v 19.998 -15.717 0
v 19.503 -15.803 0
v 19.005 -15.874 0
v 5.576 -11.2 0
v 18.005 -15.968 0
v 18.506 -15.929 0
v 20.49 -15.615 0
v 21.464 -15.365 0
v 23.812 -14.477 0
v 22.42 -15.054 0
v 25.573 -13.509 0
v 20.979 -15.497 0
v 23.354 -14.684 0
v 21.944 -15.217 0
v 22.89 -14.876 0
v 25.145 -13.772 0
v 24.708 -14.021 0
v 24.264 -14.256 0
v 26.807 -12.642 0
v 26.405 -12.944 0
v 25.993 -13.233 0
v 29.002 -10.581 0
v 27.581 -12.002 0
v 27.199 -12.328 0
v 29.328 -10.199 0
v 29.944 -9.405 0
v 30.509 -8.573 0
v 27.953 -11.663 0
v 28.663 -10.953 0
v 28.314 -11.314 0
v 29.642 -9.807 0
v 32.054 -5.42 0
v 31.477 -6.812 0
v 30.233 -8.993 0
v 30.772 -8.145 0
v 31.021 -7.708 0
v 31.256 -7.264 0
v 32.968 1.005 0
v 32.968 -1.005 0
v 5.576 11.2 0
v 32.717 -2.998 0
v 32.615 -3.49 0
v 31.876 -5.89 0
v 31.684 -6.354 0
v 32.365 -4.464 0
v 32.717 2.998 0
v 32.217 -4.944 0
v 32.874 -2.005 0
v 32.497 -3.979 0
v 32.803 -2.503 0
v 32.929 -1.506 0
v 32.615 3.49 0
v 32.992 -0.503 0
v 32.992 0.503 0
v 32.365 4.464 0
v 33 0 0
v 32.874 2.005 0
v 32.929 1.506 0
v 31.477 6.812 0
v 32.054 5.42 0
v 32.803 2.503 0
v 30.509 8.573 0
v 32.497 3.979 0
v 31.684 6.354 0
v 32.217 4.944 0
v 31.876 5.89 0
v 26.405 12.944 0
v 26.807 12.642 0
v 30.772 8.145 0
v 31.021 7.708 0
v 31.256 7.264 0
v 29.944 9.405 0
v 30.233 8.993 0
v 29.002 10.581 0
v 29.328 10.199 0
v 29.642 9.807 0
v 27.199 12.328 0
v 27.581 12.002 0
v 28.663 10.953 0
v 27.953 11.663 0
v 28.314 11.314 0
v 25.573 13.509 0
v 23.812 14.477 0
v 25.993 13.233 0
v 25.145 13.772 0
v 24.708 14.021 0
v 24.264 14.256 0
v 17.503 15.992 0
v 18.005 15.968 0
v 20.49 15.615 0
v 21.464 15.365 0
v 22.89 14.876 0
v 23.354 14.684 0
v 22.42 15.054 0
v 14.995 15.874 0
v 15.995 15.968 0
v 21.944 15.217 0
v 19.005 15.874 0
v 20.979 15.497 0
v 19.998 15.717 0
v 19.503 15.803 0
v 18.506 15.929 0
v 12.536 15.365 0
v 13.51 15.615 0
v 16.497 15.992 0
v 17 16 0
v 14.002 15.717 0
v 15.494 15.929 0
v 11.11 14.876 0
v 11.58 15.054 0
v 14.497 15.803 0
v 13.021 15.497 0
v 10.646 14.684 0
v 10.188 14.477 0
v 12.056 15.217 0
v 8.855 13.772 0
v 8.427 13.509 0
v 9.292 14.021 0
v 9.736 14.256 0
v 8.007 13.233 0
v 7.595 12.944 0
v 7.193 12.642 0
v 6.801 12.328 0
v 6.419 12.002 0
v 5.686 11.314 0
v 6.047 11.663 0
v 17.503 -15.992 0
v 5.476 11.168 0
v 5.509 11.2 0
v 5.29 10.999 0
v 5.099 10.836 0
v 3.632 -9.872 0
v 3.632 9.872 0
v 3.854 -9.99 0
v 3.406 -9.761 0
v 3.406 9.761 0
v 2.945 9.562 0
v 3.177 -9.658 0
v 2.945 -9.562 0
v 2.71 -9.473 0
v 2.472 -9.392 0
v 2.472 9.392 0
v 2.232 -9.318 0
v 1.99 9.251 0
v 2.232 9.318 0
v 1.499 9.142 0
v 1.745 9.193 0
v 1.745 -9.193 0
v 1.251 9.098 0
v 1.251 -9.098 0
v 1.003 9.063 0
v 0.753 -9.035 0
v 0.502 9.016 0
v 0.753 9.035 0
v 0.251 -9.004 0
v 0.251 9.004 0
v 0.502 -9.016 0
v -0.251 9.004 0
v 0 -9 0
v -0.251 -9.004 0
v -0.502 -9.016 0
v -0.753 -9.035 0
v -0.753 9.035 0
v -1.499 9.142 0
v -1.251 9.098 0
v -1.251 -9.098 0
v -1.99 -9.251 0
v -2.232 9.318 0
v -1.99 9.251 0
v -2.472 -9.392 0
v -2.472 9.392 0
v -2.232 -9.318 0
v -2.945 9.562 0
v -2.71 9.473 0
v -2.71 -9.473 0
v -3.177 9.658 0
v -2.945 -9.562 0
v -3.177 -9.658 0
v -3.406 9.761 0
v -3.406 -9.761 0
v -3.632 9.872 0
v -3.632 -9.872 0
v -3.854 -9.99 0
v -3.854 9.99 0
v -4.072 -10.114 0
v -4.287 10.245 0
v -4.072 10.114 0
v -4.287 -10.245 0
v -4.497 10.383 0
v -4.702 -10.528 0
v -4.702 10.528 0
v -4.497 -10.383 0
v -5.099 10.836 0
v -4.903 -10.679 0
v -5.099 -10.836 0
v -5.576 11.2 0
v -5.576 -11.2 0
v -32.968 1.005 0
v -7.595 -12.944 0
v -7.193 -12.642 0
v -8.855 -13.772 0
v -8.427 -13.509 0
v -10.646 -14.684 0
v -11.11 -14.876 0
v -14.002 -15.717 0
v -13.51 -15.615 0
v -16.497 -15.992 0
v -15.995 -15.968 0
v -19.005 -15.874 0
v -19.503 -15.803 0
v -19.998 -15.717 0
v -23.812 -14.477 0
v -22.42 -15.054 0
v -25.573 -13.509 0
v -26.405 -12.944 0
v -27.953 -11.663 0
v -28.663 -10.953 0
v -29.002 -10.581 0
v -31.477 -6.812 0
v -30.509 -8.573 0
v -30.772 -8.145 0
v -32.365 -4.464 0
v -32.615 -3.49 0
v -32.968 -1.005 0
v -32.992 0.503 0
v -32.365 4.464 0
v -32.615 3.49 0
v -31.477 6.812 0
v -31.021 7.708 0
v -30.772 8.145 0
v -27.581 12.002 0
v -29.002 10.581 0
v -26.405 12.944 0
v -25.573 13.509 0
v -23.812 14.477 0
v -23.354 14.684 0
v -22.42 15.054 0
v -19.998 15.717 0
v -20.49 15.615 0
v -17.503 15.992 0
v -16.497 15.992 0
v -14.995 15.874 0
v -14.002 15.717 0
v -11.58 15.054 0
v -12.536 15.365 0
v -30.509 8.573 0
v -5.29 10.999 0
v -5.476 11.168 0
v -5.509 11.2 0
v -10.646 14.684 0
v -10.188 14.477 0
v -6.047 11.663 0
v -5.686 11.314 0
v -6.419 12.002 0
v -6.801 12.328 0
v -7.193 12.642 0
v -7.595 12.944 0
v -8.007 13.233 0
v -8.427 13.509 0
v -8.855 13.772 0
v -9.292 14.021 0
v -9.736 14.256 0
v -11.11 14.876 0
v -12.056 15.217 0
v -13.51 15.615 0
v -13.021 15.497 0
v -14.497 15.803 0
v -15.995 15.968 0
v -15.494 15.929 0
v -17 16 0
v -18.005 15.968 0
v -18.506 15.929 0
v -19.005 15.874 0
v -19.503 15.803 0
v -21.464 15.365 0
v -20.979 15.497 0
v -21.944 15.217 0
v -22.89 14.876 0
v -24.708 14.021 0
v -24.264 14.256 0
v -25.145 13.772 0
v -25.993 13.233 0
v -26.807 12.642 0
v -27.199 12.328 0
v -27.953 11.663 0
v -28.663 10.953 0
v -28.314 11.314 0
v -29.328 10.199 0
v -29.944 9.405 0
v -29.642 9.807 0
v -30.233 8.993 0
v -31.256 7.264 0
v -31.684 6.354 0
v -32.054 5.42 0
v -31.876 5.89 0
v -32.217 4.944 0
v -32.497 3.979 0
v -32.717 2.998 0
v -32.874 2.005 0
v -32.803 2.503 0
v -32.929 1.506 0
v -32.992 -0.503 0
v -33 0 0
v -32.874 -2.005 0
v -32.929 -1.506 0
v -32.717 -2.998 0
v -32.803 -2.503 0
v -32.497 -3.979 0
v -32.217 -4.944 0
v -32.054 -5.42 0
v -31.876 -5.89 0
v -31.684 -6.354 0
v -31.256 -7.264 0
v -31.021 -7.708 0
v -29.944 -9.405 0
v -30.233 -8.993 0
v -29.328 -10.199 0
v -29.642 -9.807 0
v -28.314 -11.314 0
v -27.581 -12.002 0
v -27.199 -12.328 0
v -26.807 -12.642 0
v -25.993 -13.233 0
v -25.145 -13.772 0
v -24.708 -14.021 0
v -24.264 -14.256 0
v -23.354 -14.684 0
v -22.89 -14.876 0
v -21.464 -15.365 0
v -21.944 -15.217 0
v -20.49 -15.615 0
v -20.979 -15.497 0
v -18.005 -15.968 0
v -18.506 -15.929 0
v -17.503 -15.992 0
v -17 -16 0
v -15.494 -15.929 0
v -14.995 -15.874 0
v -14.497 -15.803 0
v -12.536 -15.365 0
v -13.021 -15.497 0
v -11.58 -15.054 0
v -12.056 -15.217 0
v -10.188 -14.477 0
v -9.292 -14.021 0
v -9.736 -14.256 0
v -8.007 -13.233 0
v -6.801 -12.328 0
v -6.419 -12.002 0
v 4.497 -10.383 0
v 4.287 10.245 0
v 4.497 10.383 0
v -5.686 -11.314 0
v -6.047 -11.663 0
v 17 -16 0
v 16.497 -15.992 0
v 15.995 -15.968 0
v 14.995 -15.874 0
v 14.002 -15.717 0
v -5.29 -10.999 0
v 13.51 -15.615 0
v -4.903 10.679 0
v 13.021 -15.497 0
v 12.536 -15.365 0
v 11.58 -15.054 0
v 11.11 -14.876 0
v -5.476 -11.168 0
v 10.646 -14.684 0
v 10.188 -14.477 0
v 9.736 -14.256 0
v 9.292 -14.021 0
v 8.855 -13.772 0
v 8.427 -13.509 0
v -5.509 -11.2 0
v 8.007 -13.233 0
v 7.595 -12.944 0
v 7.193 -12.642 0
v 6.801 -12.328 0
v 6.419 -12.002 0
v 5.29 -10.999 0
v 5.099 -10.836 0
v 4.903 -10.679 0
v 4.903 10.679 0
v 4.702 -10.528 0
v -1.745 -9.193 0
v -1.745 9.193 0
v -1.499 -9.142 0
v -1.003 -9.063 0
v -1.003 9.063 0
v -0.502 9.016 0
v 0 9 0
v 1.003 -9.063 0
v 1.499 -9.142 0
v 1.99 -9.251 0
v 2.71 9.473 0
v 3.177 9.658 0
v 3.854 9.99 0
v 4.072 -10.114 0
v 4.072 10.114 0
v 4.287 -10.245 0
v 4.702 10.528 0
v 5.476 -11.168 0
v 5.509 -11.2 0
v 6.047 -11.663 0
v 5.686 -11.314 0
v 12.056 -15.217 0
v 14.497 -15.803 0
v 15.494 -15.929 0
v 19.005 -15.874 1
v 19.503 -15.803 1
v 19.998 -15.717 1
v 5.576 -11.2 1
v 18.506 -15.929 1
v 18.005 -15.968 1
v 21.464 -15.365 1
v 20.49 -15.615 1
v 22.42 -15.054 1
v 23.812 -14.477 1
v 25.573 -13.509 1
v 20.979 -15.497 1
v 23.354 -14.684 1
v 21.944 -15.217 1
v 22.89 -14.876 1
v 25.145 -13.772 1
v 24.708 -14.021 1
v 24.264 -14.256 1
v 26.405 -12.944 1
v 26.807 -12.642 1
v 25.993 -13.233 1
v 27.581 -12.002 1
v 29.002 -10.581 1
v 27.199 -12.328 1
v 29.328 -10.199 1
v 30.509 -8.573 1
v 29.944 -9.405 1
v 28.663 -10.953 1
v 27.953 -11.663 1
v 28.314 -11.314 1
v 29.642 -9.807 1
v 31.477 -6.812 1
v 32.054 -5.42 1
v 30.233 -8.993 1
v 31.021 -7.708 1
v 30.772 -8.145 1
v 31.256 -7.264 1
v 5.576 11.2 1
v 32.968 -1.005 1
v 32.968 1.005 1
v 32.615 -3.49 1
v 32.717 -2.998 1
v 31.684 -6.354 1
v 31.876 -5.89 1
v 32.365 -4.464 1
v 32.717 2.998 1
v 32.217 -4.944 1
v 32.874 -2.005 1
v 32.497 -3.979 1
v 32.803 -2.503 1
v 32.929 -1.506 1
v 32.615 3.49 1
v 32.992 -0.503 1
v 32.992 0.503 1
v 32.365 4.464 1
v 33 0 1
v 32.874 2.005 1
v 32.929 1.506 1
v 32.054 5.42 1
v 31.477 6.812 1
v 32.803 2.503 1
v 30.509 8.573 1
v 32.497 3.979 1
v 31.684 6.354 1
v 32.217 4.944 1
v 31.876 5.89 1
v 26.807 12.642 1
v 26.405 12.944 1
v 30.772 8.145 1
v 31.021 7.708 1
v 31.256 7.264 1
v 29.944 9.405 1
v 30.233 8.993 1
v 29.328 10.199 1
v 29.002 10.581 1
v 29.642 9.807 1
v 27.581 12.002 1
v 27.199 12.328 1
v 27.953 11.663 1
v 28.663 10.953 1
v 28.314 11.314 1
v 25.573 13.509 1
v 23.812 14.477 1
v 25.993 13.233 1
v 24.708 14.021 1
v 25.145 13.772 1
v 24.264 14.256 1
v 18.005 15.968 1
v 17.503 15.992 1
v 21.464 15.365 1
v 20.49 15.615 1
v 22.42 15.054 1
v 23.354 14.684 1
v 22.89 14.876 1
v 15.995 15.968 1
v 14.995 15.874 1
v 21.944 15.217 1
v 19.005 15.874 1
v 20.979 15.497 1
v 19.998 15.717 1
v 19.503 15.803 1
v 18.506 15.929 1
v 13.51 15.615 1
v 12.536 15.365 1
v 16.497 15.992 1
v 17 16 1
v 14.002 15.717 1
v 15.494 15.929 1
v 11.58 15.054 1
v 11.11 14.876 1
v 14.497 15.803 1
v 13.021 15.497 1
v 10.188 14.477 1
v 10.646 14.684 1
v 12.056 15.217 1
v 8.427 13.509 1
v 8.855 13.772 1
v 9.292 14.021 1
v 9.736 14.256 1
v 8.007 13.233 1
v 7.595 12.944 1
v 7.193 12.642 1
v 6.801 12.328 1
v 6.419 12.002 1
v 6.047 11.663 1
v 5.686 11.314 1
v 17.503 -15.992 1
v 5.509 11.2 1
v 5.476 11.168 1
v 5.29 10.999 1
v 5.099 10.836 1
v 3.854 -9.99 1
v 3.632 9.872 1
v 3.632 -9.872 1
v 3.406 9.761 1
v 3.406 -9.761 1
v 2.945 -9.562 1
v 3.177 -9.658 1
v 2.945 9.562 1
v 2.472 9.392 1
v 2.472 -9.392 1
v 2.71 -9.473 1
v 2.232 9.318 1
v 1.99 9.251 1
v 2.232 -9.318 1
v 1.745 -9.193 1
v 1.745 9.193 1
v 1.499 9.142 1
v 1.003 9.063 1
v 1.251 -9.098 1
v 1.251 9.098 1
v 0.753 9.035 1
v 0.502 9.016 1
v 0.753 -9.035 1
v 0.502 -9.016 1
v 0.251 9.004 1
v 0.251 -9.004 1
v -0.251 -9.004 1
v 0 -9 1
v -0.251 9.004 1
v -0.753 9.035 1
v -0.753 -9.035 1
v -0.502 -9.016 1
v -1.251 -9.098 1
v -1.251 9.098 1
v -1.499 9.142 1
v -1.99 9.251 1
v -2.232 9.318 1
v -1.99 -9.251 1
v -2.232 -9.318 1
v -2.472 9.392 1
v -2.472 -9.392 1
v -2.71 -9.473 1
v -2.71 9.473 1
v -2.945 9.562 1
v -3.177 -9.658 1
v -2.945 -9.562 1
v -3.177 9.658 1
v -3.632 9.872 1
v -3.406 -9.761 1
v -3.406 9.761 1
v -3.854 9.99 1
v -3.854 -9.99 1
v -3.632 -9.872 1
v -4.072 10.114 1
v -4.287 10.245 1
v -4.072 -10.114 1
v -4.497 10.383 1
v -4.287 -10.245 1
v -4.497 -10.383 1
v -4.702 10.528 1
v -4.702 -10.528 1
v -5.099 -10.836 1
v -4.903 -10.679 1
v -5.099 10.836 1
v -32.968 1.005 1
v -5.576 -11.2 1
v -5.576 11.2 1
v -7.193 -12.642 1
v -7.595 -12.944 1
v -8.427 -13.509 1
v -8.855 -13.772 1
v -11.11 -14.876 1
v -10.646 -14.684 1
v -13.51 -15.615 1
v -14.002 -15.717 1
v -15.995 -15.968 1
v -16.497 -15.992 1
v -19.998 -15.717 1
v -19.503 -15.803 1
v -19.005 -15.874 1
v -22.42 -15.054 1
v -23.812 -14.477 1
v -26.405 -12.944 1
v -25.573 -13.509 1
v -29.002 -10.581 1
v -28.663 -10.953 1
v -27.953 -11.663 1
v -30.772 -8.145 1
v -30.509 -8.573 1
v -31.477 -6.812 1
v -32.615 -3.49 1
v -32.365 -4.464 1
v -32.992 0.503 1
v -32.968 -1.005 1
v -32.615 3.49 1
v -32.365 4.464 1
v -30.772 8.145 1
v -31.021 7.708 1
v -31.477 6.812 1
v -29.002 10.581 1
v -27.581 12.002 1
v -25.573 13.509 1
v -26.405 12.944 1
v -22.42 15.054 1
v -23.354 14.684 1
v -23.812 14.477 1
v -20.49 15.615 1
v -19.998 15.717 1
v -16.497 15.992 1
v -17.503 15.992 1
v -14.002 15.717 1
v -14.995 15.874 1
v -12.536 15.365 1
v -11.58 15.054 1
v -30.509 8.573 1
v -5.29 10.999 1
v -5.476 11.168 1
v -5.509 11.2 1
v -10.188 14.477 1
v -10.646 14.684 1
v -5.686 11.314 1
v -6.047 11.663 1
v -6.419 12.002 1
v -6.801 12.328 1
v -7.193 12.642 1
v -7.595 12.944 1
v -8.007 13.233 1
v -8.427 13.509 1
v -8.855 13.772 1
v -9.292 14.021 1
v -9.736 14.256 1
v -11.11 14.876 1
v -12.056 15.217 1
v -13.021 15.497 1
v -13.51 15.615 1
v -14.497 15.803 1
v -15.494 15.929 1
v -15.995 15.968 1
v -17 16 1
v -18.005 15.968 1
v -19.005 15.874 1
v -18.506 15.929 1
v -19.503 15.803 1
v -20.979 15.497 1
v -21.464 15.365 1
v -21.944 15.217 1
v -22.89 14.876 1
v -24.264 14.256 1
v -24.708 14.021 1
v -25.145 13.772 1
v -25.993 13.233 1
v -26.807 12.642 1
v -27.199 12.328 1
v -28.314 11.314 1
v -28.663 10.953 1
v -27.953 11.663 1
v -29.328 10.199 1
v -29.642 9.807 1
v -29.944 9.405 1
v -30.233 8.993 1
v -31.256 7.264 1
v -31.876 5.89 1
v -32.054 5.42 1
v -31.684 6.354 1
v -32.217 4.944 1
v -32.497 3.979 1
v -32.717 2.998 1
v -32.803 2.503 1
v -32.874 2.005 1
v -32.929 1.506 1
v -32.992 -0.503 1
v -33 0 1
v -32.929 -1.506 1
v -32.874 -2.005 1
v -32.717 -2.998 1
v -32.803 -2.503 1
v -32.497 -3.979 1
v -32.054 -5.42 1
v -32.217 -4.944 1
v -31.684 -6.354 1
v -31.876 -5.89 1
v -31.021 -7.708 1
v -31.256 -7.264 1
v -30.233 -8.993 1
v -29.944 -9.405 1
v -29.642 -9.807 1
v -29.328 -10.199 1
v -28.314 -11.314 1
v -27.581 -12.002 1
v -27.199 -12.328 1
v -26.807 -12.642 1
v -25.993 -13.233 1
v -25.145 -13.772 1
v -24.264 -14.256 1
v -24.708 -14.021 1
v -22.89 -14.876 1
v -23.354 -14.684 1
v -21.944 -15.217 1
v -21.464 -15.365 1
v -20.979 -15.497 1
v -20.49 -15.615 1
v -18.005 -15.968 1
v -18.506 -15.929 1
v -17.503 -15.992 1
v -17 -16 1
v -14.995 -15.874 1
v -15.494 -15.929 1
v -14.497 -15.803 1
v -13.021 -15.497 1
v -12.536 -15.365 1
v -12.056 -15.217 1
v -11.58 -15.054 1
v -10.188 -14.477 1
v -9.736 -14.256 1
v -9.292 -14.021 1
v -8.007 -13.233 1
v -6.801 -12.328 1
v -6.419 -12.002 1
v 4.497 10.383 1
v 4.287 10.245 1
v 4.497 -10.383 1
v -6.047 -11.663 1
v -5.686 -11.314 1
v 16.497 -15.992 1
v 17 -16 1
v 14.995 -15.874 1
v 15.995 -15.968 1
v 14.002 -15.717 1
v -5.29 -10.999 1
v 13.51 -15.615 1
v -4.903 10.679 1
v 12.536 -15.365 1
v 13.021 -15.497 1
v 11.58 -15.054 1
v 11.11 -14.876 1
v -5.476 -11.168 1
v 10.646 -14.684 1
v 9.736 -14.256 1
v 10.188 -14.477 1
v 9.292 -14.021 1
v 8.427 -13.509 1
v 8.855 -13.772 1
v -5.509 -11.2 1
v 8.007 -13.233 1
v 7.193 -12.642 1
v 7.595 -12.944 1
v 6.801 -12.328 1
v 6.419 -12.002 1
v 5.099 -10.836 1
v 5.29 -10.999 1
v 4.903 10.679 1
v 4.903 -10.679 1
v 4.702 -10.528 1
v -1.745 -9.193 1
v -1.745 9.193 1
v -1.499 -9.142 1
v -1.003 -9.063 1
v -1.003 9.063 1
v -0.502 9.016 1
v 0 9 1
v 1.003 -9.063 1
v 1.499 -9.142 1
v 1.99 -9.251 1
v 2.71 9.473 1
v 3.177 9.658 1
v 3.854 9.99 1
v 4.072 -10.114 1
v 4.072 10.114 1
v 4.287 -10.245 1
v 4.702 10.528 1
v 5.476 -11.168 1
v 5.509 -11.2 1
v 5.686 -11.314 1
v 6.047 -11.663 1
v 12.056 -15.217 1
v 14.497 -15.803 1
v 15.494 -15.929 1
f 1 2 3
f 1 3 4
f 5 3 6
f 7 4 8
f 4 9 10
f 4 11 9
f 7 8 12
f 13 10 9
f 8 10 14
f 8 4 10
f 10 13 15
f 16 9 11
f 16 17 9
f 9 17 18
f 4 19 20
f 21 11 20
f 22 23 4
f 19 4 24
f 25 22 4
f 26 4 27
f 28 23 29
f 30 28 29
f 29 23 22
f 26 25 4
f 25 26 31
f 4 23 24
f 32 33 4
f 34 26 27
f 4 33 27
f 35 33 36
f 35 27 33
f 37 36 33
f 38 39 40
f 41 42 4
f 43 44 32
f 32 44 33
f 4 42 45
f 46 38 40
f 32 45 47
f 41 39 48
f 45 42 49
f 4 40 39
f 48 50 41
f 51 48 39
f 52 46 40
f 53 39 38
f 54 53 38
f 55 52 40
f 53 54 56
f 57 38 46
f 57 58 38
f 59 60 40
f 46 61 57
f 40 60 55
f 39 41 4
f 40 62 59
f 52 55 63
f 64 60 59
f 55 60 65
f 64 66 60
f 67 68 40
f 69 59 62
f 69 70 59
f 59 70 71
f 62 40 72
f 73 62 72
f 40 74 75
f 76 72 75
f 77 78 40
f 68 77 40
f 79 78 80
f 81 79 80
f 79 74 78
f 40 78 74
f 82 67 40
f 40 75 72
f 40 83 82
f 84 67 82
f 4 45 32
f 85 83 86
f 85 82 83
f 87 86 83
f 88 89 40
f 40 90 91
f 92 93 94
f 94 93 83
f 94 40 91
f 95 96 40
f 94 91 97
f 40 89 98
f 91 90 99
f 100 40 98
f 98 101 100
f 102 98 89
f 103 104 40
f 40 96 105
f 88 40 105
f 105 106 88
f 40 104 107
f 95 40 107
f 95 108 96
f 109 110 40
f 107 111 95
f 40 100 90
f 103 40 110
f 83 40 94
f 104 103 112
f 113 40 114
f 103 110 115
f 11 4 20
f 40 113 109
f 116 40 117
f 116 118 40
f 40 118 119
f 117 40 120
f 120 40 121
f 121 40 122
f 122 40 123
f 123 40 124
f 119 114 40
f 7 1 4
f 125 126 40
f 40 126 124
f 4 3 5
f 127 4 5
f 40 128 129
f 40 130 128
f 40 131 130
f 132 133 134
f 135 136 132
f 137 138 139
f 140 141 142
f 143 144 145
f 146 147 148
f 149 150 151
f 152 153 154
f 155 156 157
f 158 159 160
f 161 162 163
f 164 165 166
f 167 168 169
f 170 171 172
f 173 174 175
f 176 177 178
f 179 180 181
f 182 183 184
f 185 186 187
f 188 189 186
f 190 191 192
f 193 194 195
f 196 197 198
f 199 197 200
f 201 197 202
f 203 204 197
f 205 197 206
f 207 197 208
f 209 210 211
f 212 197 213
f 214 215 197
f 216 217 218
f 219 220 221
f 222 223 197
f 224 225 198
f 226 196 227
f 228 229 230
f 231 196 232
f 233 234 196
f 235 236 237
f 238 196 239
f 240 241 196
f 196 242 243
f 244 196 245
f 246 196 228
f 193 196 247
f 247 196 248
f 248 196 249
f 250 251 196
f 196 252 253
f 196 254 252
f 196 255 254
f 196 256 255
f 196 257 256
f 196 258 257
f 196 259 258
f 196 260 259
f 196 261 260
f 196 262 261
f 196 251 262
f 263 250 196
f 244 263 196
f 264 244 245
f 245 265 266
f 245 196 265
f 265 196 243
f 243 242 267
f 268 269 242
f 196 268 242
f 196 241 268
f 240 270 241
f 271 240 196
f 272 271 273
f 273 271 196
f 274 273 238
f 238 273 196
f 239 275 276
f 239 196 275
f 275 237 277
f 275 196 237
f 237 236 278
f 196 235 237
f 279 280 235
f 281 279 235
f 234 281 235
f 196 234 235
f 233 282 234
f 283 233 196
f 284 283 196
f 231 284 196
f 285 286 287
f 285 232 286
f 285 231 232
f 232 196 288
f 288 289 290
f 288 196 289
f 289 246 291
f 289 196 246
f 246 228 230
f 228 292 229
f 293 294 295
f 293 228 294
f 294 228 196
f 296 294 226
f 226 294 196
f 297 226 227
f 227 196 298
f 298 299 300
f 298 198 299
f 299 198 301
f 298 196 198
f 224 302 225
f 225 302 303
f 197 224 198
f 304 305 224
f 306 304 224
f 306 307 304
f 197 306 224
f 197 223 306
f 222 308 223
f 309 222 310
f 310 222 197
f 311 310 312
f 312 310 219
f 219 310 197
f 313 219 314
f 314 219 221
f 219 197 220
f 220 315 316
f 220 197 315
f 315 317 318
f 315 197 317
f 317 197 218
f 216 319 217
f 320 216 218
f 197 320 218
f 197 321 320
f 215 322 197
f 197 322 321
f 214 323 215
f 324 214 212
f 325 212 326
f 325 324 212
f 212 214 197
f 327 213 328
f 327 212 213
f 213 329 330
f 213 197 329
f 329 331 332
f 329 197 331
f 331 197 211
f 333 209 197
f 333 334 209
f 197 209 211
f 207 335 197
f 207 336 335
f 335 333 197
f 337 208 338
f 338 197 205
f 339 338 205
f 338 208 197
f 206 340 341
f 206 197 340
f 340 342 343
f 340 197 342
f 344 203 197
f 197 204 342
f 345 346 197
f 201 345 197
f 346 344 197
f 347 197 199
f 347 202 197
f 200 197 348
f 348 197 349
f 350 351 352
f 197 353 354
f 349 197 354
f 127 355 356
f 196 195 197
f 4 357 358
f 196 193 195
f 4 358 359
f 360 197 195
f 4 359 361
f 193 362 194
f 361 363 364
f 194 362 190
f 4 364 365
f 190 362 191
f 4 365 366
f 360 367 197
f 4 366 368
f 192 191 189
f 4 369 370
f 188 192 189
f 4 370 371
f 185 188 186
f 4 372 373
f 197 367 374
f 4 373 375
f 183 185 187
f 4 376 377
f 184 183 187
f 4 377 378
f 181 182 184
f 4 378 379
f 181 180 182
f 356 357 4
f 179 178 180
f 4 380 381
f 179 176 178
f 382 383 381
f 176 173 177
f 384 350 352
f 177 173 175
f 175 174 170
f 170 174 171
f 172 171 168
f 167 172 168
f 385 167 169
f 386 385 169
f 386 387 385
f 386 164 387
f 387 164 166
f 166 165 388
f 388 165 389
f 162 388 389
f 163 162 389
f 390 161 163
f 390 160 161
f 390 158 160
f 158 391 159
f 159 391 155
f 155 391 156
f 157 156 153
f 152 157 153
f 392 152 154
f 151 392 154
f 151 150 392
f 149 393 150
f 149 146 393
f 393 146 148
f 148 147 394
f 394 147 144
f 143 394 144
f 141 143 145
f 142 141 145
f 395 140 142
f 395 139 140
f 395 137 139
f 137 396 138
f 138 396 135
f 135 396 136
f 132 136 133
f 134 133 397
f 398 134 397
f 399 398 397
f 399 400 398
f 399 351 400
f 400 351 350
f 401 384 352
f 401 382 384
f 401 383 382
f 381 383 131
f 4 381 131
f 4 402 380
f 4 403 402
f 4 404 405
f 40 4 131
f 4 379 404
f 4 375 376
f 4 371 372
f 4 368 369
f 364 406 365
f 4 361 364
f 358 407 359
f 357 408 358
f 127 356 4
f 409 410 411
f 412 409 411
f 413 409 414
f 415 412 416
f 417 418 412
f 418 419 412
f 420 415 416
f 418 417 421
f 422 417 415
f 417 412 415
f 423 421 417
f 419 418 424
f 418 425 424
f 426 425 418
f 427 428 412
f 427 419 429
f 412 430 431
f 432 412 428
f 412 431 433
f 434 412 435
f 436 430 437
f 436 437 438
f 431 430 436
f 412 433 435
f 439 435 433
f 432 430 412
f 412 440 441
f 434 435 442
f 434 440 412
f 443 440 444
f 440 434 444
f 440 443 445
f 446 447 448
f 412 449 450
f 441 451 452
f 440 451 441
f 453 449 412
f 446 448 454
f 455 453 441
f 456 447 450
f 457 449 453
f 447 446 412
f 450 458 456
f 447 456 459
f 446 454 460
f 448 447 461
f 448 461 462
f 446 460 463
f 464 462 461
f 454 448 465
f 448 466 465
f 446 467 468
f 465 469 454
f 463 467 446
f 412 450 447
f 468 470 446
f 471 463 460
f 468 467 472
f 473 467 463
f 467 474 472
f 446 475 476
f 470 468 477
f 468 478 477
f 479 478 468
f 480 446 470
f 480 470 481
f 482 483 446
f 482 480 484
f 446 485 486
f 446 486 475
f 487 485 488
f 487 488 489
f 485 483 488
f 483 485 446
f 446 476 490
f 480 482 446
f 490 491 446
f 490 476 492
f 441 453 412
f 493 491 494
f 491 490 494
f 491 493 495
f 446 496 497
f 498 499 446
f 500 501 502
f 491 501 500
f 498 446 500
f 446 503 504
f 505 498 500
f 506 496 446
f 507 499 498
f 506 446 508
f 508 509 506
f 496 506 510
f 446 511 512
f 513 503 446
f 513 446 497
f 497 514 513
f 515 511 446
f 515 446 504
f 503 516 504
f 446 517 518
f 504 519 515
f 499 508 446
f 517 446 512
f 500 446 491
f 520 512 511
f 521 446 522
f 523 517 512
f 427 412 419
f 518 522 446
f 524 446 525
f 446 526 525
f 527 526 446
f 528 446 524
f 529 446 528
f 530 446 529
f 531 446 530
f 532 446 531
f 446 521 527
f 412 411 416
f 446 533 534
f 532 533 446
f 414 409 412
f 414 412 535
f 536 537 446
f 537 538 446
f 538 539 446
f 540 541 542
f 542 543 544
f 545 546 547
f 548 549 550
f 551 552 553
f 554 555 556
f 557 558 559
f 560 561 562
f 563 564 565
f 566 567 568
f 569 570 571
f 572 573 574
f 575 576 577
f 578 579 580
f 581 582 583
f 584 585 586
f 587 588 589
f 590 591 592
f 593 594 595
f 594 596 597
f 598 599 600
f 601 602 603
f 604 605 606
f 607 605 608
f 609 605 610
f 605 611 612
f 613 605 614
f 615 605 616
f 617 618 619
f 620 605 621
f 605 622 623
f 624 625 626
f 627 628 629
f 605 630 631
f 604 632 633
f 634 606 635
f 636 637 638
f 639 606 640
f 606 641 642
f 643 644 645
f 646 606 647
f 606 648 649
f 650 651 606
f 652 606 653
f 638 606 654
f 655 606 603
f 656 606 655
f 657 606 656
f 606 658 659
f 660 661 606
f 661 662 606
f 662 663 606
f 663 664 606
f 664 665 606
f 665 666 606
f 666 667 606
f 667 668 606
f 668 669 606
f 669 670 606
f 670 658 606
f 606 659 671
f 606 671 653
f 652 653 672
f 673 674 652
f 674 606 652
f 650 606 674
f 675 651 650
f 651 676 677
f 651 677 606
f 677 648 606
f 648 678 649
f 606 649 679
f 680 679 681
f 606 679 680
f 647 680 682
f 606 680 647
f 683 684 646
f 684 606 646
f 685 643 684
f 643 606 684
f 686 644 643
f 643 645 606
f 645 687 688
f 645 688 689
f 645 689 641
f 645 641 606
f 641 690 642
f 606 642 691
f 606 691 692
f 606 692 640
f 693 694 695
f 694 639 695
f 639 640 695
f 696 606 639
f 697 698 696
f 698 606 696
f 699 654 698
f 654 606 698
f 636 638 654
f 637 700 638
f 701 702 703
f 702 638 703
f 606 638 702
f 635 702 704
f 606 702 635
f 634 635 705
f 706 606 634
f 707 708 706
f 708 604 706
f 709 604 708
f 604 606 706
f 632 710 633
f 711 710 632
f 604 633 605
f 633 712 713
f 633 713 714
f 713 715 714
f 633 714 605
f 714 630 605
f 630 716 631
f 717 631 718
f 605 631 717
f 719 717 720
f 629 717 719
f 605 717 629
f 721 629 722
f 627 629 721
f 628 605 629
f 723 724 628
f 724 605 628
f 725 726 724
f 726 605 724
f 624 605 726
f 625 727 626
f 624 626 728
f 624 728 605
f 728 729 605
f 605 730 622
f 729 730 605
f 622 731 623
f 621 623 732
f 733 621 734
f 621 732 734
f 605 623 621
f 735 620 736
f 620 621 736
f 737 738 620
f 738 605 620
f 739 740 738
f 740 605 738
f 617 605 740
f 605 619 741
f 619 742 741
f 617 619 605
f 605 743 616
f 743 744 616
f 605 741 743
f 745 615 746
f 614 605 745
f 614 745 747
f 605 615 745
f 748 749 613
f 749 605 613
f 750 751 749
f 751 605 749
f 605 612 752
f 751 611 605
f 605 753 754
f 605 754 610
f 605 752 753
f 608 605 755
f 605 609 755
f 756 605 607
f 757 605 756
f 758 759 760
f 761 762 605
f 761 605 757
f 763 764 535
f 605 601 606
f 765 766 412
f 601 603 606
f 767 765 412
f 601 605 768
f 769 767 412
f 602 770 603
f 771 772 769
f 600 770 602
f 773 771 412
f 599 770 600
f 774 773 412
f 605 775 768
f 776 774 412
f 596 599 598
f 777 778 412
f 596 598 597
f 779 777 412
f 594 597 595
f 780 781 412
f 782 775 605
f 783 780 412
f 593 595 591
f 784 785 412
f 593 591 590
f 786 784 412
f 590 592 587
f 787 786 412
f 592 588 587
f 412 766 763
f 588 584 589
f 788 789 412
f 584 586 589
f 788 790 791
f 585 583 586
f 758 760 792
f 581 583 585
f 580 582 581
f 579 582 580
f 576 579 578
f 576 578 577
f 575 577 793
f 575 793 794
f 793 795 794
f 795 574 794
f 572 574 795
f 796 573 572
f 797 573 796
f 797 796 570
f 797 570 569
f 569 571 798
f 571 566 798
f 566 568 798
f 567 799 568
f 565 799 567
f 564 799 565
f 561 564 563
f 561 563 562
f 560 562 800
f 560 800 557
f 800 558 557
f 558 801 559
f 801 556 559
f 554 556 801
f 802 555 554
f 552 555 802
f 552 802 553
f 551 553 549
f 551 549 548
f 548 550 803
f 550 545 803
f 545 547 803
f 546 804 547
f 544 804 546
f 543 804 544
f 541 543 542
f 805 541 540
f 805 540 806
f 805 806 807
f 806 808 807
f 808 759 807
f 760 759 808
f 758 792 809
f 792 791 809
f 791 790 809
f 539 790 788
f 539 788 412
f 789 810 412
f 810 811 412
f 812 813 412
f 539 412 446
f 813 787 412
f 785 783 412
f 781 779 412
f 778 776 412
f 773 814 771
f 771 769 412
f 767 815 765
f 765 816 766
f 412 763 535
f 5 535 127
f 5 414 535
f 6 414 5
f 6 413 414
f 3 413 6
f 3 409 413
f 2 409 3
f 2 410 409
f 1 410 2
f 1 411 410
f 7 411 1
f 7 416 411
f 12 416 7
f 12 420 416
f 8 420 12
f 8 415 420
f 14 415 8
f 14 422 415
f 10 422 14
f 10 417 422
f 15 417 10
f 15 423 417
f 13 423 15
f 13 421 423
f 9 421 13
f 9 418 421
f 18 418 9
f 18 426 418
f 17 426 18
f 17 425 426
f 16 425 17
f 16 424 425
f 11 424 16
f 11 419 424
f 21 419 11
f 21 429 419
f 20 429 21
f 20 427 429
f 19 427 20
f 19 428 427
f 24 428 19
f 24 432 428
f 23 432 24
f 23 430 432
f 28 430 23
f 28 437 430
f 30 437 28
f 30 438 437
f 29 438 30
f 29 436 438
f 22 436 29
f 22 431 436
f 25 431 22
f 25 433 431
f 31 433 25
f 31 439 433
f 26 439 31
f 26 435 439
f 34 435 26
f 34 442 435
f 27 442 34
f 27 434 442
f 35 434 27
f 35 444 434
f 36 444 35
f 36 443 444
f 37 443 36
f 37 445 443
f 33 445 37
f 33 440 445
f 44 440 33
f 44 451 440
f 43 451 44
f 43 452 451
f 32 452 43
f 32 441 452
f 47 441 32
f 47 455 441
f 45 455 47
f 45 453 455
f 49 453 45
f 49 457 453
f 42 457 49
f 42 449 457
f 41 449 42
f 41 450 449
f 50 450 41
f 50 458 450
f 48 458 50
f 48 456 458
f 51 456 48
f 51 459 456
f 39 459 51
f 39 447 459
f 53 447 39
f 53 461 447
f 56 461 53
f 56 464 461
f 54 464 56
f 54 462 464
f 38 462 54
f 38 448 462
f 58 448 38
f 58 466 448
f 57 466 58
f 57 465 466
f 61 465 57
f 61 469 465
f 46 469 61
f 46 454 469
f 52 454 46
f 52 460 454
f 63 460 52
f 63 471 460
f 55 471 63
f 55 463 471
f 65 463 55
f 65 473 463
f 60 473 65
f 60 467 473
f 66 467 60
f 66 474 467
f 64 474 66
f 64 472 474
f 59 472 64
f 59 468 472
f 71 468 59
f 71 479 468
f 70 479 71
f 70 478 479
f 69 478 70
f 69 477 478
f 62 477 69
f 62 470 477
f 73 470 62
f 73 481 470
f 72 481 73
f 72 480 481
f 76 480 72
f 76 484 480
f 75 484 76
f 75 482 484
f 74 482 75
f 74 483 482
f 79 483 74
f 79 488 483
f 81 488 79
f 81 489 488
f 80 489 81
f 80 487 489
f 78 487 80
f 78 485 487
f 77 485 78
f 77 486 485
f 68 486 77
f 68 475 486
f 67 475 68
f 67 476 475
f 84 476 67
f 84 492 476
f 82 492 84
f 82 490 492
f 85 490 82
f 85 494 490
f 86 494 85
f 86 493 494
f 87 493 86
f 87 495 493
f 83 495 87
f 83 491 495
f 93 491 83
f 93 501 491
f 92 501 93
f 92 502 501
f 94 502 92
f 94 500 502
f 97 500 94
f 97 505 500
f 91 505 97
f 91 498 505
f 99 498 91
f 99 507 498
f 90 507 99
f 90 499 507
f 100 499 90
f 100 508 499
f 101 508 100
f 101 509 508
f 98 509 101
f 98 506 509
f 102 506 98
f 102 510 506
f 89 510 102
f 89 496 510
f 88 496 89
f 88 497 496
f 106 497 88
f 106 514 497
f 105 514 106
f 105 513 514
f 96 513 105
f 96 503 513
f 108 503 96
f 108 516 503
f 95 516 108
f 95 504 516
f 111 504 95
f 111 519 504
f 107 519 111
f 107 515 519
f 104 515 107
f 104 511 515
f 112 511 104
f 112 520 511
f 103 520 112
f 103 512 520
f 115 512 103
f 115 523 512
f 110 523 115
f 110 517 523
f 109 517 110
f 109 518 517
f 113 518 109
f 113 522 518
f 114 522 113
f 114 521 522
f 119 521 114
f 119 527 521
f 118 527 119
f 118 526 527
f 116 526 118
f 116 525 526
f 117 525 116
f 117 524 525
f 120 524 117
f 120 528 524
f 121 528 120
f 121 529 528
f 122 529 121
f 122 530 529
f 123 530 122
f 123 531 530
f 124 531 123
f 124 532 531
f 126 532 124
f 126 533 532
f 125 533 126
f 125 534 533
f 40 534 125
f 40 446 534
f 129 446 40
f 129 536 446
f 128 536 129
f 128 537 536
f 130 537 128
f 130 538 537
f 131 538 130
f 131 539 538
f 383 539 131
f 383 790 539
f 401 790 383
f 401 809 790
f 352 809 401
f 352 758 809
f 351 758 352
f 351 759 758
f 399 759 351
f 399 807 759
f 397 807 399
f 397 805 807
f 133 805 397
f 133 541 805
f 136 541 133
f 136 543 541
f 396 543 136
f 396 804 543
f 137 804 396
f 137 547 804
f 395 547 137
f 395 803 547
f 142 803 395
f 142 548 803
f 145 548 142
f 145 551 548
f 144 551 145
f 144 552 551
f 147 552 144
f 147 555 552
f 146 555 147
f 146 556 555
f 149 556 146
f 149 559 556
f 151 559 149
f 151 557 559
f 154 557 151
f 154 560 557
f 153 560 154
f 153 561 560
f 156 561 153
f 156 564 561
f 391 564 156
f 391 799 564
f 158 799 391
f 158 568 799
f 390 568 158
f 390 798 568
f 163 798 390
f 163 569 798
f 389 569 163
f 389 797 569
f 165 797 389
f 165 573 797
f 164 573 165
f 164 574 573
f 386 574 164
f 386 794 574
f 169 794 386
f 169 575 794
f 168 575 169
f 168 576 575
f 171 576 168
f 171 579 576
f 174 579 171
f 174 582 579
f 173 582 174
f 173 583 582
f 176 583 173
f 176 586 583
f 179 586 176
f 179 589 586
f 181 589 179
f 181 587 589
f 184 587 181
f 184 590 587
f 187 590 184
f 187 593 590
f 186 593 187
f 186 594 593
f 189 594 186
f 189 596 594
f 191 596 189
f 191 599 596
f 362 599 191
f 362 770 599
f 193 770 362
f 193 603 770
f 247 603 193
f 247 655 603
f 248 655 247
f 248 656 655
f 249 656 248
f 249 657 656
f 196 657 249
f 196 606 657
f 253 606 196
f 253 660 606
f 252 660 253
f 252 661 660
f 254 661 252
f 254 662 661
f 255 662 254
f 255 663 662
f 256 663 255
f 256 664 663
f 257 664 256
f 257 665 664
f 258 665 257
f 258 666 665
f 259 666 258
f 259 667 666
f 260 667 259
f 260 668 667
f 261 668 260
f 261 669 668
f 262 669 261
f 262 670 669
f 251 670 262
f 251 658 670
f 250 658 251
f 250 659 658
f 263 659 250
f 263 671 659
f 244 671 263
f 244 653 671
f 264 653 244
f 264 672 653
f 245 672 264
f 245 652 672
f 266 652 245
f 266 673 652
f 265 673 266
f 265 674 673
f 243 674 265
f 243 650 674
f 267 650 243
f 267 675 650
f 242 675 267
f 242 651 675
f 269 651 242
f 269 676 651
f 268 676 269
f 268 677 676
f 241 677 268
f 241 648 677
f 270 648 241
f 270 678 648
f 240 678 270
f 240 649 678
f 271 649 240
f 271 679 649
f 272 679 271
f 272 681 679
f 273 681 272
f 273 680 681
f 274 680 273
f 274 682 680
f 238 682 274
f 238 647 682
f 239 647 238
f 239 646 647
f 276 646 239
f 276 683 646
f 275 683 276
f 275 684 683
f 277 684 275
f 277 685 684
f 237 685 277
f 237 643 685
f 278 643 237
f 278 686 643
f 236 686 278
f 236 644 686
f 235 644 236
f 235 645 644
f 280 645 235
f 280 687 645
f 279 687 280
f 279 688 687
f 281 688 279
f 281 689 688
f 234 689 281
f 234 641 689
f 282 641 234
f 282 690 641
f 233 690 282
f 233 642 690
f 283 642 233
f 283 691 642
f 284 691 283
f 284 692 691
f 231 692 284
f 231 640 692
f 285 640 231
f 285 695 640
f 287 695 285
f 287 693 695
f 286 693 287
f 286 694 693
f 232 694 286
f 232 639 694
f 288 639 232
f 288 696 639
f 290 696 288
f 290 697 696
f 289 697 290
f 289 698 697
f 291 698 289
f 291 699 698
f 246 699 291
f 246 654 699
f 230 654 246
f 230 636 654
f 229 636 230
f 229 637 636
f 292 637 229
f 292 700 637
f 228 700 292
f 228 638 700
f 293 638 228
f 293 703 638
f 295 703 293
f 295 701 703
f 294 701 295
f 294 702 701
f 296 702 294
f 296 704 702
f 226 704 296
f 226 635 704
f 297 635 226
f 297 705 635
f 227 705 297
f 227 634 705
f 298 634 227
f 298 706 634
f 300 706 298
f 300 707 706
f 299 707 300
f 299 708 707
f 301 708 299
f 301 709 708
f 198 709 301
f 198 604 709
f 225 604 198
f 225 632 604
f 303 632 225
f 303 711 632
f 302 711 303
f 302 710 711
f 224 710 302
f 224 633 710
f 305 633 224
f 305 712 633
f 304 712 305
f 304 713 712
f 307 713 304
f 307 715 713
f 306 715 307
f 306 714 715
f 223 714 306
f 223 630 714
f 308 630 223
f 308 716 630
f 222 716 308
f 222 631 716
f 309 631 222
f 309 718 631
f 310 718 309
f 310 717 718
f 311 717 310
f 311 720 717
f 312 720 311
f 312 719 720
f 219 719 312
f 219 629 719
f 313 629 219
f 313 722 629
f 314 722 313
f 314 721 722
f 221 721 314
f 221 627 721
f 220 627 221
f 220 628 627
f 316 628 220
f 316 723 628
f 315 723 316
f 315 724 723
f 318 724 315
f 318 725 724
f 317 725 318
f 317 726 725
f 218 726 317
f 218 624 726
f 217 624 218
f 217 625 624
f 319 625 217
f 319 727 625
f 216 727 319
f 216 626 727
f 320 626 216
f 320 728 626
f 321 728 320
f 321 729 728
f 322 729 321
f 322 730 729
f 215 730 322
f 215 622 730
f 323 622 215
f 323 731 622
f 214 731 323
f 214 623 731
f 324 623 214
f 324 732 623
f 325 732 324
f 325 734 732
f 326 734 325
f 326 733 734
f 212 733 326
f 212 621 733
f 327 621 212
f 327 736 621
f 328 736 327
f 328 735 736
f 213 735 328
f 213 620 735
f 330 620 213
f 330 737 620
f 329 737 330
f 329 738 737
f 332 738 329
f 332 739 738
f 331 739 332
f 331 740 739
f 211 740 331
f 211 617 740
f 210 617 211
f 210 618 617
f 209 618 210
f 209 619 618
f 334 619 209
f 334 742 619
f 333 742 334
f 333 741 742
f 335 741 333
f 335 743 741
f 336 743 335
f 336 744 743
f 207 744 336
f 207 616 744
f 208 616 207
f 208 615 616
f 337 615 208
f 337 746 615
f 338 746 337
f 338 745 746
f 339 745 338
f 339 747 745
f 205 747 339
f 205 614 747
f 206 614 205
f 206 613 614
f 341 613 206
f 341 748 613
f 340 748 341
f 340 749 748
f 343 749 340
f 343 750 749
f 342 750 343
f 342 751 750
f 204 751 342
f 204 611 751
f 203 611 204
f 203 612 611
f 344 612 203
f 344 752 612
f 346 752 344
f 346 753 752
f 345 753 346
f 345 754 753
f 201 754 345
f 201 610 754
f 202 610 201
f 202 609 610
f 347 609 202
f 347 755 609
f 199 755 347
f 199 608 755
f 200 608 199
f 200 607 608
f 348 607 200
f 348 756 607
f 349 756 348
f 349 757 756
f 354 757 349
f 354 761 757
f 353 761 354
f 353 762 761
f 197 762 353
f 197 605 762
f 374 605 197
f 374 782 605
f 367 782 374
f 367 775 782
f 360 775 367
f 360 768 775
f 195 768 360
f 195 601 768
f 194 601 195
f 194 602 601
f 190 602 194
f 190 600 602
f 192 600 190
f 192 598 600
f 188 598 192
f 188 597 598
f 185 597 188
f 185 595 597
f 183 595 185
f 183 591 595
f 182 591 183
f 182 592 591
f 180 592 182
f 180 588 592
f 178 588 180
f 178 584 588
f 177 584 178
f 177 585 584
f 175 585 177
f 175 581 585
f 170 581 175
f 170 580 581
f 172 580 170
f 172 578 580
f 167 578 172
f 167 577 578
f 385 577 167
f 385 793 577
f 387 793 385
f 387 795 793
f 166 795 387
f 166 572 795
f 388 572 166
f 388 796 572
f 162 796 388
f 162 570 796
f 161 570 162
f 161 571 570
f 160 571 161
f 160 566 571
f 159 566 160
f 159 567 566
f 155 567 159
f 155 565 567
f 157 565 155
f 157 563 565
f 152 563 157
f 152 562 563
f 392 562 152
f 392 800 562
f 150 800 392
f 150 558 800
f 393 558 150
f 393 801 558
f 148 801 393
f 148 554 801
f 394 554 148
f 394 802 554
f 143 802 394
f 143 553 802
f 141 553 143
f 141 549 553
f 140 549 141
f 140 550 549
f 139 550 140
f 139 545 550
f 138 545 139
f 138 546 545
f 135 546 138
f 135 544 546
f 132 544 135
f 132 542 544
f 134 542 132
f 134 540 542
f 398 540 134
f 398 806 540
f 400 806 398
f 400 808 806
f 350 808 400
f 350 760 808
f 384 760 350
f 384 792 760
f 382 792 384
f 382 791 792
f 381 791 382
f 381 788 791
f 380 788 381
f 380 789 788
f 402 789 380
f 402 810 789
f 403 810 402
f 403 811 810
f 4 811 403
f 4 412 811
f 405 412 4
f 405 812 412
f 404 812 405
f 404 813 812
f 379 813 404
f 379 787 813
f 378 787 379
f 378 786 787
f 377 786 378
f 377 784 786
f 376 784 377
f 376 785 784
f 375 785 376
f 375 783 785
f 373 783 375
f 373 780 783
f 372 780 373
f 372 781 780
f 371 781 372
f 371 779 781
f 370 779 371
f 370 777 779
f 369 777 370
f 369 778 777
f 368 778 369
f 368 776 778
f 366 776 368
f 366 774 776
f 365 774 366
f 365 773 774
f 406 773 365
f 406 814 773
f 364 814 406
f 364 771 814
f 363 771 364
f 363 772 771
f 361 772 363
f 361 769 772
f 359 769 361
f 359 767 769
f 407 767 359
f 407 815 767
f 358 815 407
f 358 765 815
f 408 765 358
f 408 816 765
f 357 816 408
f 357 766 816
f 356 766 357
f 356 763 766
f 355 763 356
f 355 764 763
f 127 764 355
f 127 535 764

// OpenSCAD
bot_r = 33/2;
top_r = 30/2;

// The real bases are more like 3.7mm, but printing that requires 0.1mm layers,
// which is slow. Also a 3.7mm base fits a bit too snugly in the castle ladders.
// 3.6mm seems fine.
height = 3.6;

$fn = 200;

inlay_depth = 1;
lip = 0.8;
inlay_slack = 0.3;

// Make the inlay 1 layer shorter than the cavity for it, to make sure we don't
// accidentally thicken the overall part.
inlay_thickness = inlay_depth-0.2;

penny_diam = 19.25;
penny_height = 1.63;

module single_base() {
  round_r = 0.75;
  difference() {
    rotate_extrude() {
      hull() {
        translate([bot_r-round_r, round_r])
          circle(round_r);
        square([1, height]);
        translate([top_r-1, 0])
          square([1, height]);
      }
    }
    
    // Elephant foot.
    linear_extrude(0.2) {
      difference() {
        circle(100);
        circle(bot_r - round_r + 0.05);
      }
    }
    
    // Inlay well.
    translate([0, 0, height - inlay_depth])
      cylinder(h=inlay_depth+1, r=top_r-lip);
  }
}

// Large single base (like for the Frost Giant), just scale this up to 113%.
module single_large_base_penny() {
  difference() {
    scale([1.13, 1.13, 1])
      single_base();
    
    translate([5.7, 0, height - inlay_depth - penny_height])
      cylinder(d=penny_diam, h=10);
  }
}

module single_inlay() {
  cylinder(h=inlay_thickness, r=top_r-lip-inlay_slack);
}

module single_large_inlay() {
  scale([1.13, 1.13, 1])
    single_inlay();
}

// Largest profile of the double base.
module double_base_2d(large=false) {
  // Large measurements from Brunak. Small measurements from Major Q10.
  length = large ? 81.9 : 77.8;
  width = large ? 37.4 : 31.9;
  waist = large ? 24.7 : 18.4;
  cut_radius = large ? 23.5 : 27;
  
  difference() {
    union() {
      for (a = [-1, 1])
        translate([a*(length - width)/2, 0])
          circle(d=width);
      square([length - width, width*0.83], center=true);
    }
    for (a = [-1, 1])
      translate([0, a*(waist/2 + cut_radius)])
        circle(cut_radius);
  }
}

module double_base_layer(layers_up, offs, large=false) {
  translate([0, 0, layers_up*0.2])
    linear_extrude(0.20001)
      offset(offs)
        double_base_2d(large=large);
}

double_base_slope = 0.115;
double_base_layer_offsets = [
  -0.6, -0.2,
  0, 0,
  -1*double_base_slope,
  -2*double_base_slope,
  -3*double_base_slope,
  -4*double_base_slope,
  -5*double_base_slope,
  -6*double_base_slope,
  -7*double_base_slope,
  -8*double_base_slope,
  -9*double_base_slope,
  -10*double_base_slope,
  -11*double_base_slope,
  -12*double_base_slope,
  -13*double_base_slope,
  -14*double_base_slope,
];
double_base_layer_top_offset = double_base_layer_offsets[17];

module double_base(large=false, pennies=false, washers=0) {
  difference() {
    // Need a total of 18 layers to make 3.6mm.
    for (i = [0:17])
      double_base_layer(i, double_base_layer_offsets[i], large=large);
        
    // Inlay well.
    translate([0, 0, height - inlay_depth])
      linear_extrude(inlay_depth+1)
        offset(double_base_layer_top_offset - lip)
          double_base_2d(large=large);
    
    if (pennies) {
      for (a = [-1, 1])
        scale([a, 1, 1])
          translate([
            large ? 23 : 23.1,
            large ? 
              0 // Change to 6 to offset the pennies.
              : 3.9,
            height - inlay_depth - penny_height
          ])
            cylinder(d=penny_diam, h=10);
      
      // Notch to show which side has the the pennies.
      translate([0, 12, 0])
        cube([1.3, 10, 0.4], center=true);
    }
    
    washer_diam = 11.35;
    washer_height = 1.12;

    if (washers == 1) {
      for (a = [-1, 1])
        scale([a, 1, 1])
          translate([large ? 25.5 : 23.5, 0, height - inlay_depth - washer_height - 0.11])
            cylinder(d=washer_diam + 0.2, h=10);
    } else if (washers == 2) {
      for (a = [-1, 1], b = [-1, 1])
        scale([a, b, 1])
          translate([large ? 23 : 23.5, large ? 10.4 : 7.71, height - inlay_depth - washer_height - 0.11])
            cylinder(d=washer_diam + 0.2, h=10);
    }
  }
}

module double_inlay(large=false) {
  linear_extrude(inlay_thickness)
    offset(double_base_layer_top_offset - lip - inlay_slack)
      double_base_2d(large=large);
}

// For the DRG board game, oppressor figure.
module oppressor_base() {
  length = 66;
  width = 32;
  waist = 18;
  cut_radius = 8;
  
  linear_extrude(1) {
    difference() {
      union() {
        for (a = [-1, 1])
          translate([a*(length - width)/2, 0])
            circle(d=width);
        square([length - width, width*0.7], center=true);
      }
      for (a = [-1, 1])
        translate([0, a*(waist/2 + cut_radius)])
          circle(cut_radius);
    }
  }
}

// I printed the double bases with 70% fill to help weight the large figures.


oppressor_base();
